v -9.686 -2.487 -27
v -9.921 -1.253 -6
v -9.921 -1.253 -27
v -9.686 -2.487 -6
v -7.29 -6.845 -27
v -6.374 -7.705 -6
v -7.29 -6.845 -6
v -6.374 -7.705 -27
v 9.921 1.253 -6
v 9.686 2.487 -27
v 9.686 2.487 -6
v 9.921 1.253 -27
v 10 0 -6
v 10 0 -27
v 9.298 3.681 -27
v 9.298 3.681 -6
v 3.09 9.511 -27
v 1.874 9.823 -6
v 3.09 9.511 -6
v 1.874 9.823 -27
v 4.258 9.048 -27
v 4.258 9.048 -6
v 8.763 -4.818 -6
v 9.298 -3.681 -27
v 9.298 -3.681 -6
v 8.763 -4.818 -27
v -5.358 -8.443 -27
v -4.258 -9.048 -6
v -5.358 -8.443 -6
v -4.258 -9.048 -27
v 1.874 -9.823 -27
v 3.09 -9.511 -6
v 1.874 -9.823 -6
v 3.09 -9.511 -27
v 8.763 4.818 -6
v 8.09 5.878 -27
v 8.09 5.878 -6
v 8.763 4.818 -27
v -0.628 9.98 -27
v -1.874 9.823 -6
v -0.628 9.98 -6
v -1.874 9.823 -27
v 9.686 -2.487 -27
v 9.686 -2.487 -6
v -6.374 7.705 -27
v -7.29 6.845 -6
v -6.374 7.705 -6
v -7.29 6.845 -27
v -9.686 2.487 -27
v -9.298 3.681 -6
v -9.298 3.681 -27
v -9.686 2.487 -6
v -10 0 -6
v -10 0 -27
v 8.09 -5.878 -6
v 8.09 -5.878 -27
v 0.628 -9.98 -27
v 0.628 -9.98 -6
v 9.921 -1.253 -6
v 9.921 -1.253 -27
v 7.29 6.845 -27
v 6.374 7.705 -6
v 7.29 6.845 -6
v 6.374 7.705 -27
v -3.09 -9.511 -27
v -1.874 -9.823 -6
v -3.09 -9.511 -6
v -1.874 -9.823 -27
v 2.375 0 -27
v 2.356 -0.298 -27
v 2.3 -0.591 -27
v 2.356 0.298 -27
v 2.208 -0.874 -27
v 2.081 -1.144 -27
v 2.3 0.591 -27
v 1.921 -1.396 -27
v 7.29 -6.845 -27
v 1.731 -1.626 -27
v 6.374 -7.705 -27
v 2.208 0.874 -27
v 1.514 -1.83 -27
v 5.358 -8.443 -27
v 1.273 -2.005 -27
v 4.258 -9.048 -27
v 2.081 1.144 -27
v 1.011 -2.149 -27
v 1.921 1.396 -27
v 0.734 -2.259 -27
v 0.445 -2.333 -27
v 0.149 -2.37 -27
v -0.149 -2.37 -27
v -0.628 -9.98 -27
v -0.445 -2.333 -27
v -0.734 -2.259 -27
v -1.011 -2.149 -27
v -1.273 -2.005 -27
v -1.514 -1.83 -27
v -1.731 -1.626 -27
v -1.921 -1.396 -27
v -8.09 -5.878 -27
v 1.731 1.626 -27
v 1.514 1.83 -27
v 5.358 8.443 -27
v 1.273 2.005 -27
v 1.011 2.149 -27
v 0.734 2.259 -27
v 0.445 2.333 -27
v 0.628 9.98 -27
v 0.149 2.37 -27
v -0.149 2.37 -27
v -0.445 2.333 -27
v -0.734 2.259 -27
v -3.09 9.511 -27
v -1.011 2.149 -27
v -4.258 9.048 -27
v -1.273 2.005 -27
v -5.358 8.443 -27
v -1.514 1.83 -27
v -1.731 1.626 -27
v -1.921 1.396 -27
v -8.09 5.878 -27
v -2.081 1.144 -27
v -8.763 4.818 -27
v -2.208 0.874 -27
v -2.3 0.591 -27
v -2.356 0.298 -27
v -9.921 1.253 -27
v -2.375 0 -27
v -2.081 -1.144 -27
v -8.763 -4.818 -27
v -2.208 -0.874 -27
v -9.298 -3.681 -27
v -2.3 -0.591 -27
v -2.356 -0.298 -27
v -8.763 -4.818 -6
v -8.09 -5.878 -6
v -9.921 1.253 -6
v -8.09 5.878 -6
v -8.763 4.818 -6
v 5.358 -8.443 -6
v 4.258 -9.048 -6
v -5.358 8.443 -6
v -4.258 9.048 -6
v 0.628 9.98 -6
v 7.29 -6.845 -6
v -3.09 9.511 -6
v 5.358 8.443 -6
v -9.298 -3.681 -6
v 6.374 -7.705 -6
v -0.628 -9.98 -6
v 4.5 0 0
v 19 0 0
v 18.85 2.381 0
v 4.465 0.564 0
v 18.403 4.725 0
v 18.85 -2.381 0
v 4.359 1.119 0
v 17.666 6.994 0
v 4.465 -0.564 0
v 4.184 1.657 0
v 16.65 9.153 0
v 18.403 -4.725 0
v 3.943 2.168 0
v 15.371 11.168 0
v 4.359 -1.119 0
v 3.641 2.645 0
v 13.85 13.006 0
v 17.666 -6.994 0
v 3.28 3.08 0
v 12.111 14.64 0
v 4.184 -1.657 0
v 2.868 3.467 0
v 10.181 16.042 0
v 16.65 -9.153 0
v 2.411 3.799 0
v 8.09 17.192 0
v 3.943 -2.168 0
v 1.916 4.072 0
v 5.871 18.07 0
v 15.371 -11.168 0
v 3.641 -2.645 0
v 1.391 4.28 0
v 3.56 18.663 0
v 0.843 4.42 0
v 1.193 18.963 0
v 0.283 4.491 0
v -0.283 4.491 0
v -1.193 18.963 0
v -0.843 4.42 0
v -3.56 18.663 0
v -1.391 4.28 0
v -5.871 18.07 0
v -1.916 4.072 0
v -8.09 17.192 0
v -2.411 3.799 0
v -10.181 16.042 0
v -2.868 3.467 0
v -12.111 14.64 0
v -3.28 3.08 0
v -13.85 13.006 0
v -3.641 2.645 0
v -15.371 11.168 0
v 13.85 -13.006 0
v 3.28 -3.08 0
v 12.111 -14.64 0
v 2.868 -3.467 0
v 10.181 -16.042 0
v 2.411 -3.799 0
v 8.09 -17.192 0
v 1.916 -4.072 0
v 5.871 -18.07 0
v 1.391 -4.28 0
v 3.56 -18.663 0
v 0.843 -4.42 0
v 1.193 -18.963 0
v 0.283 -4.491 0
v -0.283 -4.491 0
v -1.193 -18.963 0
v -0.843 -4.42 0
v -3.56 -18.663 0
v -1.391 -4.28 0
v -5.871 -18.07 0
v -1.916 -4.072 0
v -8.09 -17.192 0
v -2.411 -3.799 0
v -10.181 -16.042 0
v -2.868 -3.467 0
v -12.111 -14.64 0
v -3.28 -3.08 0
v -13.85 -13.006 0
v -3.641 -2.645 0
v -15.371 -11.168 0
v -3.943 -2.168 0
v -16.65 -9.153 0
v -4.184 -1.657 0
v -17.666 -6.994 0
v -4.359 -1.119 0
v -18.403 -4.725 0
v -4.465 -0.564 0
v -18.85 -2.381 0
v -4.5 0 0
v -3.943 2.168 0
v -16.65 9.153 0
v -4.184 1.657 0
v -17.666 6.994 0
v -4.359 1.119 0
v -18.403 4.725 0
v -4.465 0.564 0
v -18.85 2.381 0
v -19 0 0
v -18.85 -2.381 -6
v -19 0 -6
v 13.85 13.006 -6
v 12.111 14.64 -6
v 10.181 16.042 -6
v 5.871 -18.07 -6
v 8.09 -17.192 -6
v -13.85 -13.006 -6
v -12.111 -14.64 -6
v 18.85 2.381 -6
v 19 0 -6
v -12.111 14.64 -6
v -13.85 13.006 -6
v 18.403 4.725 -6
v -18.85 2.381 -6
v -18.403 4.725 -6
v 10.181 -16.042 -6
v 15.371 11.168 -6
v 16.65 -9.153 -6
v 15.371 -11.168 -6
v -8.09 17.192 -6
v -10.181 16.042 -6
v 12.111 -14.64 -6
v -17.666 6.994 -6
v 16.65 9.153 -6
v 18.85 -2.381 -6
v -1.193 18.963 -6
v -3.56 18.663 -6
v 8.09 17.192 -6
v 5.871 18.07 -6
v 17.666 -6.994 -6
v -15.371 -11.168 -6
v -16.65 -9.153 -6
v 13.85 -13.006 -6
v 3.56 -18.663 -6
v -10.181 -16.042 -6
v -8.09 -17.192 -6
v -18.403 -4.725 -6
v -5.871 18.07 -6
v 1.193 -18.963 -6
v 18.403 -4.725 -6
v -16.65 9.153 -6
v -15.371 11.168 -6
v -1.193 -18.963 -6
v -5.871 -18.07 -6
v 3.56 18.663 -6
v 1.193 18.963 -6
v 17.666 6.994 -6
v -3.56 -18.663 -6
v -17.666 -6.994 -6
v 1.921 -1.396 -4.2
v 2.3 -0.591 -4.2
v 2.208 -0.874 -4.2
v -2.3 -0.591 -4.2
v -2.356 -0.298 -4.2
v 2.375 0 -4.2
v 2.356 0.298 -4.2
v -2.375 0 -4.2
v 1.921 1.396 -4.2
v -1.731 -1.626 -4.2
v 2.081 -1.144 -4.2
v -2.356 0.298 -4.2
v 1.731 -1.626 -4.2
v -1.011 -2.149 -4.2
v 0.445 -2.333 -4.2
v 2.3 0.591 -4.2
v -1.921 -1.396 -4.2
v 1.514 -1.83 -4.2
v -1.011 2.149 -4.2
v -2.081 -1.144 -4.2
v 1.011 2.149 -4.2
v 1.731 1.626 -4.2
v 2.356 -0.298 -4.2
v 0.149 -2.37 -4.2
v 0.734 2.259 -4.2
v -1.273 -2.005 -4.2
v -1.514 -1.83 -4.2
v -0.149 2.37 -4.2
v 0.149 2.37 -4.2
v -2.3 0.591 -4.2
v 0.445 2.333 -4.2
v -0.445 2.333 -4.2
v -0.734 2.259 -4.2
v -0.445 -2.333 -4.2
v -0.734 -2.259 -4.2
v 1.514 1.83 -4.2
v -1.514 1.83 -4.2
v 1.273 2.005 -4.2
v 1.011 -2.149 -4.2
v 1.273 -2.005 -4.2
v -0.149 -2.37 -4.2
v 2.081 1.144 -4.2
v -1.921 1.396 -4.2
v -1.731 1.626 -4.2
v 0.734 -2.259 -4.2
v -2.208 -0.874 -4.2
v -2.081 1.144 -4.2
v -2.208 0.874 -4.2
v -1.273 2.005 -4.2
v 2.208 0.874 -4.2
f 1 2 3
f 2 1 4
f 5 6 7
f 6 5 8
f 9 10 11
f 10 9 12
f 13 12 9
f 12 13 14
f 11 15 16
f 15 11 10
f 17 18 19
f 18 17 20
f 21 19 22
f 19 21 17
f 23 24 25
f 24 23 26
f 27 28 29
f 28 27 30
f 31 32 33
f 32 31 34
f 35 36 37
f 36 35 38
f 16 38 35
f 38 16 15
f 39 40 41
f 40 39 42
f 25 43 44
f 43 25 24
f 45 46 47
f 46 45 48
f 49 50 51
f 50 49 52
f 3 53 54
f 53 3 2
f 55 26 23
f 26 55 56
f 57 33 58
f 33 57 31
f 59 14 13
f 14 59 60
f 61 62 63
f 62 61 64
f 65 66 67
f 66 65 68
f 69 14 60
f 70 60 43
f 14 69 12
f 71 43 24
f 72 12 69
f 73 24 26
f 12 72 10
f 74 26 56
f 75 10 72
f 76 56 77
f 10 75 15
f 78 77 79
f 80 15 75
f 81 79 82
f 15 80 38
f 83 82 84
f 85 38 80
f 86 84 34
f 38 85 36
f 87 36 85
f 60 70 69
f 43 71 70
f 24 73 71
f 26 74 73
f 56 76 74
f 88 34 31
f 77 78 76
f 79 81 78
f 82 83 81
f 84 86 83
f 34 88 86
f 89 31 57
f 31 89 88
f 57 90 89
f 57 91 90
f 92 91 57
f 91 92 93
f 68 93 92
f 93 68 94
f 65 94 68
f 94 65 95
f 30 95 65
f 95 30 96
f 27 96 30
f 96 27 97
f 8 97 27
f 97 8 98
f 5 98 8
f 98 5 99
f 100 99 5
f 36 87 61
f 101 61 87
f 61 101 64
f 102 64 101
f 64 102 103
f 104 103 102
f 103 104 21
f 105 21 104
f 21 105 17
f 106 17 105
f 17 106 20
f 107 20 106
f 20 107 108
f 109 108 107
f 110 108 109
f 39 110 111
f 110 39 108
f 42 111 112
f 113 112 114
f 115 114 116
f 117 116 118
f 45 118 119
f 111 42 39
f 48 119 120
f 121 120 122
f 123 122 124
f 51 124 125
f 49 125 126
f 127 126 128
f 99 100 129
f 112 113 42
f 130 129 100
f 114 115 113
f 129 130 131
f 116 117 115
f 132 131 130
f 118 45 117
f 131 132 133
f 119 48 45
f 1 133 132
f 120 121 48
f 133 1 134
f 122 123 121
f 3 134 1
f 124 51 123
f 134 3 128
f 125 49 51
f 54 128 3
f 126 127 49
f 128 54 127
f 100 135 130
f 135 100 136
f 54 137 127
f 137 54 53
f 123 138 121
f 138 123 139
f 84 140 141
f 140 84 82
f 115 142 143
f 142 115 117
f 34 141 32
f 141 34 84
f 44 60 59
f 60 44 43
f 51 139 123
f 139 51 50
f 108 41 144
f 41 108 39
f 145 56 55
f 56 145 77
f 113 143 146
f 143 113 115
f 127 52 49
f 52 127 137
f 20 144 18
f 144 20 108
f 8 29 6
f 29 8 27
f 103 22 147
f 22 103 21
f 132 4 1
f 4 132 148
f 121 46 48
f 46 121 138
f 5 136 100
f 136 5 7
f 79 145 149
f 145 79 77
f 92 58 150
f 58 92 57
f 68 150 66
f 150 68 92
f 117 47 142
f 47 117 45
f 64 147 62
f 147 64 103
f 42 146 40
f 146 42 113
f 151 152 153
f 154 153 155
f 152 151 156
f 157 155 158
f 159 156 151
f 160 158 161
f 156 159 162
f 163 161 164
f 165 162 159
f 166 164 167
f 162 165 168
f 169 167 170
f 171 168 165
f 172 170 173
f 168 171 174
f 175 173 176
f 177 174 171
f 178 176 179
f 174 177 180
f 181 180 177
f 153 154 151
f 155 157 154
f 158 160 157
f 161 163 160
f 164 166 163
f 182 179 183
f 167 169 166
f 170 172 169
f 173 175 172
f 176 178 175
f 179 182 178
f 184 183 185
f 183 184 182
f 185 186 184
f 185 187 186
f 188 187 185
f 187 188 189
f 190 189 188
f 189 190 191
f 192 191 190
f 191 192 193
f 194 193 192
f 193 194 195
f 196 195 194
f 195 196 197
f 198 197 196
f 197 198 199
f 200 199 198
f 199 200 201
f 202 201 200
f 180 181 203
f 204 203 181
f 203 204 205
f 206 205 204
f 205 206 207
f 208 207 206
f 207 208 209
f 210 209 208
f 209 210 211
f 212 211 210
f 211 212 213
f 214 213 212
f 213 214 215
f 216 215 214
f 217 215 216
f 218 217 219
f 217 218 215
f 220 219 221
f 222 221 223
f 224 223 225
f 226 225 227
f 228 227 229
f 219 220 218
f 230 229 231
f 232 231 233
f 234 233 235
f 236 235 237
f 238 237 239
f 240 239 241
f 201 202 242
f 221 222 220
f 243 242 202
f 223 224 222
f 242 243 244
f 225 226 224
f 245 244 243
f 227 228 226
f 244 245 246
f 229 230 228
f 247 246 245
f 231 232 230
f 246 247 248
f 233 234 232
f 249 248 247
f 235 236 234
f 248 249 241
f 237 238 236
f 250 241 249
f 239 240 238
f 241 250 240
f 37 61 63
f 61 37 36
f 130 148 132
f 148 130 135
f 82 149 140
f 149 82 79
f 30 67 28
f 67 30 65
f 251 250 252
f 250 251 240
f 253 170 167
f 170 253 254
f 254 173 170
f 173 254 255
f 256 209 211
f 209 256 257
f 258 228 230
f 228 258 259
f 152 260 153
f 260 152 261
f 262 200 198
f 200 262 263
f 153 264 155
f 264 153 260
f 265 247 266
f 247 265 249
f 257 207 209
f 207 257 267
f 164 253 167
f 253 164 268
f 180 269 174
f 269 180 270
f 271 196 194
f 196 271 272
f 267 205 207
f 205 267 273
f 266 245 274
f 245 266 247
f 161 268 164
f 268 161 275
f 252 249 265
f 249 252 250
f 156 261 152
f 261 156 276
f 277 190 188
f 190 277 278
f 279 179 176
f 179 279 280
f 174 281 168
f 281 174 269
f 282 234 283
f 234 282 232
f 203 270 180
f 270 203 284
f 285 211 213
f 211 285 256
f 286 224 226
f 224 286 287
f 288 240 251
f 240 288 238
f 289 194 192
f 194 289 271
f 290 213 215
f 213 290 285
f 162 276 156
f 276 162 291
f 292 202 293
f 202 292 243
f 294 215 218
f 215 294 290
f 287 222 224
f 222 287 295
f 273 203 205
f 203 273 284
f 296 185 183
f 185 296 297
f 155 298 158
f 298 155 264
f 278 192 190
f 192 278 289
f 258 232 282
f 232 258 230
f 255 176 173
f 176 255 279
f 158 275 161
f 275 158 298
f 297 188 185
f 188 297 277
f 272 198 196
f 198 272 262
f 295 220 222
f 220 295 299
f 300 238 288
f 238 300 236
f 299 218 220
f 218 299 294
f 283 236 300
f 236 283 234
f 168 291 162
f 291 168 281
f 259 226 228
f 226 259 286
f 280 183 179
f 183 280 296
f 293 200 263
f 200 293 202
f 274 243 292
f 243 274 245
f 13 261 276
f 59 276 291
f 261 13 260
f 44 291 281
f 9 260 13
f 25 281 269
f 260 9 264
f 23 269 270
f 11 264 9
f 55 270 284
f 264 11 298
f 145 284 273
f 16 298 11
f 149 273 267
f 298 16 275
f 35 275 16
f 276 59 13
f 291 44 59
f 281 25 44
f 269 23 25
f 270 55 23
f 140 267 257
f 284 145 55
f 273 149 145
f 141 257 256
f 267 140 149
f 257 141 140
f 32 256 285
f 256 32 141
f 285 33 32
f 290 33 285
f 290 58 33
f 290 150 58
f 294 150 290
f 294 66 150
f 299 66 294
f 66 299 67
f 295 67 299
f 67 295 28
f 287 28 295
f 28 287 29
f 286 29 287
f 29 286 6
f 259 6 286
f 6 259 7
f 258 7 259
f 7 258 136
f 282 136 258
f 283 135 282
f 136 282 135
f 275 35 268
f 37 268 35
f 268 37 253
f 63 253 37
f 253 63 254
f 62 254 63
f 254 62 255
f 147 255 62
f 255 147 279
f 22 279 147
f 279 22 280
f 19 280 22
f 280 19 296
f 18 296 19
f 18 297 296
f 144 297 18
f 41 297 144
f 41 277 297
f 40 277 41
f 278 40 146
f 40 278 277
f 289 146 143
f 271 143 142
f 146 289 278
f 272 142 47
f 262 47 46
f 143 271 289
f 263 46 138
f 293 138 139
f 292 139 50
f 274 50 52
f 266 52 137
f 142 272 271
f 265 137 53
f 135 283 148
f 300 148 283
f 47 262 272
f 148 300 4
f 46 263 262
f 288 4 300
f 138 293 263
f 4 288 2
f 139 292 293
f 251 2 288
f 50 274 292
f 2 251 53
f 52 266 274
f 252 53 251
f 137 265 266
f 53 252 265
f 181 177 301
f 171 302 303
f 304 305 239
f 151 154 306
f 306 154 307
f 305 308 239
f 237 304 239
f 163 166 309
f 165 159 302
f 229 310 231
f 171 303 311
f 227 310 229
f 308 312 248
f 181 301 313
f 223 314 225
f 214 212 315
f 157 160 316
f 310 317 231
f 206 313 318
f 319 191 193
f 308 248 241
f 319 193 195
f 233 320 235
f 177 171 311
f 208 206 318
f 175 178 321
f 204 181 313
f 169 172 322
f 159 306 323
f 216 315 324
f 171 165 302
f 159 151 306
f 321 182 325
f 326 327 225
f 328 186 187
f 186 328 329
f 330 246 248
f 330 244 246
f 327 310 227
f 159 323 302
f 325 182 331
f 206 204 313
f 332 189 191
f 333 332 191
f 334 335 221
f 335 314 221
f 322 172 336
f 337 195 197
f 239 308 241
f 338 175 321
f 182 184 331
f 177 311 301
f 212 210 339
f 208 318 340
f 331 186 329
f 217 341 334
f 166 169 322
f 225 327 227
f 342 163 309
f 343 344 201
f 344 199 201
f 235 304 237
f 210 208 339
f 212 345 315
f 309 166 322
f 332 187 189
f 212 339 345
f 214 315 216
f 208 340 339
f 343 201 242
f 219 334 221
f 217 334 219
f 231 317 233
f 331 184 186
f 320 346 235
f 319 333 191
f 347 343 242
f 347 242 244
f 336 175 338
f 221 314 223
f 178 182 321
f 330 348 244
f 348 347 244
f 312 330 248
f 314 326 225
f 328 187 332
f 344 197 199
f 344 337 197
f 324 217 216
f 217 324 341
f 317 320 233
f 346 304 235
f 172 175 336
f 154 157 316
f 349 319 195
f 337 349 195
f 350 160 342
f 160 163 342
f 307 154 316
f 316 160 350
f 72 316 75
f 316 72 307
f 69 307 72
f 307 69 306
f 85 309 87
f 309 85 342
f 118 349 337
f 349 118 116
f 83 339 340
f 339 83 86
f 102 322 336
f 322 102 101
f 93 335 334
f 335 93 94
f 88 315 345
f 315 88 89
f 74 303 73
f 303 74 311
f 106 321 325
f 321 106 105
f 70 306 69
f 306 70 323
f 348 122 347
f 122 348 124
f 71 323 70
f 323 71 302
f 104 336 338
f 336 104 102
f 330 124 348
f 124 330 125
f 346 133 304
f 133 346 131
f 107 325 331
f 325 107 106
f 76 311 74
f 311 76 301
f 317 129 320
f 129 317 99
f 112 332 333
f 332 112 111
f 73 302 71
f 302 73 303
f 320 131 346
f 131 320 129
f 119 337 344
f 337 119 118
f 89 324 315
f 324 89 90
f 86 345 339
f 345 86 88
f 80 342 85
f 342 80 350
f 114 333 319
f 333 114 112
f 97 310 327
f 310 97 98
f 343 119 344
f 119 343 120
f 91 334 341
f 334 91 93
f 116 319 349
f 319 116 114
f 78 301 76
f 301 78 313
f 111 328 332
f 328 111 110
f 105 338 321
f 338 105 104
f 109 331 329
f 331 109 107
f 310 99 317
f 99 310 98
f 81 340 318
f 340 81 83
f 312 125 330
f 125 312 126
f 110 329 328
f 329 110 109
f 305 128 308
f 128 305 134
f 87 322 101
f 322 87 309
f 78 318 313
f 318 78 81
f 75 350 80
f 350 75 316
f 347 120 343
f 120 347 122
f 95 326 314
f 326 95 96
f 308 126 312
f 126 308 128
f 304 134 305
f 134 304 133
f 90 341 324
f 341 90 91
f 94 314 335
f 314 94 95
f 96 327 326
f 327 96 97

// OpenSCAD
$fn = 50;


difference() {
	union() {
		translate(v = [0, 0, -27.0000000000]) {
			cylinder(h = 27, r = 10.0000000000);
		}
		translate(v = [0, 0, -6.0000000000]) {
			cylinder(h = 6, r = 19.0000000000);
		}
	}
	union() {
		translate(v = [0, 0, 0]) {
			rotate(a = [0, 0, 0]) {
				difference() {
					union() {
						#translate(v = [0, 0, -27.0000000000]) {
							cylinder(h = 27, r = 2.2500000000);
						}
						#translate(v = [0, 0, -4.2000000000]) {
							cylinder(h = 4.2000000000, r = 10.0000000000, r1 = 2.3750000000, r2 = 4.5000000000);
						}
						#translate(v = [0, 0, -27.0000000000]) {
							cylinder(h = 27, r = 2.3750000000);
						}
						#translate(v = [0, 0, -27.0000000000]) {
							cylinder(h = 27, r = 2.2500000000);
						}
					}
					union();
				}
			}
		}
	}
}
